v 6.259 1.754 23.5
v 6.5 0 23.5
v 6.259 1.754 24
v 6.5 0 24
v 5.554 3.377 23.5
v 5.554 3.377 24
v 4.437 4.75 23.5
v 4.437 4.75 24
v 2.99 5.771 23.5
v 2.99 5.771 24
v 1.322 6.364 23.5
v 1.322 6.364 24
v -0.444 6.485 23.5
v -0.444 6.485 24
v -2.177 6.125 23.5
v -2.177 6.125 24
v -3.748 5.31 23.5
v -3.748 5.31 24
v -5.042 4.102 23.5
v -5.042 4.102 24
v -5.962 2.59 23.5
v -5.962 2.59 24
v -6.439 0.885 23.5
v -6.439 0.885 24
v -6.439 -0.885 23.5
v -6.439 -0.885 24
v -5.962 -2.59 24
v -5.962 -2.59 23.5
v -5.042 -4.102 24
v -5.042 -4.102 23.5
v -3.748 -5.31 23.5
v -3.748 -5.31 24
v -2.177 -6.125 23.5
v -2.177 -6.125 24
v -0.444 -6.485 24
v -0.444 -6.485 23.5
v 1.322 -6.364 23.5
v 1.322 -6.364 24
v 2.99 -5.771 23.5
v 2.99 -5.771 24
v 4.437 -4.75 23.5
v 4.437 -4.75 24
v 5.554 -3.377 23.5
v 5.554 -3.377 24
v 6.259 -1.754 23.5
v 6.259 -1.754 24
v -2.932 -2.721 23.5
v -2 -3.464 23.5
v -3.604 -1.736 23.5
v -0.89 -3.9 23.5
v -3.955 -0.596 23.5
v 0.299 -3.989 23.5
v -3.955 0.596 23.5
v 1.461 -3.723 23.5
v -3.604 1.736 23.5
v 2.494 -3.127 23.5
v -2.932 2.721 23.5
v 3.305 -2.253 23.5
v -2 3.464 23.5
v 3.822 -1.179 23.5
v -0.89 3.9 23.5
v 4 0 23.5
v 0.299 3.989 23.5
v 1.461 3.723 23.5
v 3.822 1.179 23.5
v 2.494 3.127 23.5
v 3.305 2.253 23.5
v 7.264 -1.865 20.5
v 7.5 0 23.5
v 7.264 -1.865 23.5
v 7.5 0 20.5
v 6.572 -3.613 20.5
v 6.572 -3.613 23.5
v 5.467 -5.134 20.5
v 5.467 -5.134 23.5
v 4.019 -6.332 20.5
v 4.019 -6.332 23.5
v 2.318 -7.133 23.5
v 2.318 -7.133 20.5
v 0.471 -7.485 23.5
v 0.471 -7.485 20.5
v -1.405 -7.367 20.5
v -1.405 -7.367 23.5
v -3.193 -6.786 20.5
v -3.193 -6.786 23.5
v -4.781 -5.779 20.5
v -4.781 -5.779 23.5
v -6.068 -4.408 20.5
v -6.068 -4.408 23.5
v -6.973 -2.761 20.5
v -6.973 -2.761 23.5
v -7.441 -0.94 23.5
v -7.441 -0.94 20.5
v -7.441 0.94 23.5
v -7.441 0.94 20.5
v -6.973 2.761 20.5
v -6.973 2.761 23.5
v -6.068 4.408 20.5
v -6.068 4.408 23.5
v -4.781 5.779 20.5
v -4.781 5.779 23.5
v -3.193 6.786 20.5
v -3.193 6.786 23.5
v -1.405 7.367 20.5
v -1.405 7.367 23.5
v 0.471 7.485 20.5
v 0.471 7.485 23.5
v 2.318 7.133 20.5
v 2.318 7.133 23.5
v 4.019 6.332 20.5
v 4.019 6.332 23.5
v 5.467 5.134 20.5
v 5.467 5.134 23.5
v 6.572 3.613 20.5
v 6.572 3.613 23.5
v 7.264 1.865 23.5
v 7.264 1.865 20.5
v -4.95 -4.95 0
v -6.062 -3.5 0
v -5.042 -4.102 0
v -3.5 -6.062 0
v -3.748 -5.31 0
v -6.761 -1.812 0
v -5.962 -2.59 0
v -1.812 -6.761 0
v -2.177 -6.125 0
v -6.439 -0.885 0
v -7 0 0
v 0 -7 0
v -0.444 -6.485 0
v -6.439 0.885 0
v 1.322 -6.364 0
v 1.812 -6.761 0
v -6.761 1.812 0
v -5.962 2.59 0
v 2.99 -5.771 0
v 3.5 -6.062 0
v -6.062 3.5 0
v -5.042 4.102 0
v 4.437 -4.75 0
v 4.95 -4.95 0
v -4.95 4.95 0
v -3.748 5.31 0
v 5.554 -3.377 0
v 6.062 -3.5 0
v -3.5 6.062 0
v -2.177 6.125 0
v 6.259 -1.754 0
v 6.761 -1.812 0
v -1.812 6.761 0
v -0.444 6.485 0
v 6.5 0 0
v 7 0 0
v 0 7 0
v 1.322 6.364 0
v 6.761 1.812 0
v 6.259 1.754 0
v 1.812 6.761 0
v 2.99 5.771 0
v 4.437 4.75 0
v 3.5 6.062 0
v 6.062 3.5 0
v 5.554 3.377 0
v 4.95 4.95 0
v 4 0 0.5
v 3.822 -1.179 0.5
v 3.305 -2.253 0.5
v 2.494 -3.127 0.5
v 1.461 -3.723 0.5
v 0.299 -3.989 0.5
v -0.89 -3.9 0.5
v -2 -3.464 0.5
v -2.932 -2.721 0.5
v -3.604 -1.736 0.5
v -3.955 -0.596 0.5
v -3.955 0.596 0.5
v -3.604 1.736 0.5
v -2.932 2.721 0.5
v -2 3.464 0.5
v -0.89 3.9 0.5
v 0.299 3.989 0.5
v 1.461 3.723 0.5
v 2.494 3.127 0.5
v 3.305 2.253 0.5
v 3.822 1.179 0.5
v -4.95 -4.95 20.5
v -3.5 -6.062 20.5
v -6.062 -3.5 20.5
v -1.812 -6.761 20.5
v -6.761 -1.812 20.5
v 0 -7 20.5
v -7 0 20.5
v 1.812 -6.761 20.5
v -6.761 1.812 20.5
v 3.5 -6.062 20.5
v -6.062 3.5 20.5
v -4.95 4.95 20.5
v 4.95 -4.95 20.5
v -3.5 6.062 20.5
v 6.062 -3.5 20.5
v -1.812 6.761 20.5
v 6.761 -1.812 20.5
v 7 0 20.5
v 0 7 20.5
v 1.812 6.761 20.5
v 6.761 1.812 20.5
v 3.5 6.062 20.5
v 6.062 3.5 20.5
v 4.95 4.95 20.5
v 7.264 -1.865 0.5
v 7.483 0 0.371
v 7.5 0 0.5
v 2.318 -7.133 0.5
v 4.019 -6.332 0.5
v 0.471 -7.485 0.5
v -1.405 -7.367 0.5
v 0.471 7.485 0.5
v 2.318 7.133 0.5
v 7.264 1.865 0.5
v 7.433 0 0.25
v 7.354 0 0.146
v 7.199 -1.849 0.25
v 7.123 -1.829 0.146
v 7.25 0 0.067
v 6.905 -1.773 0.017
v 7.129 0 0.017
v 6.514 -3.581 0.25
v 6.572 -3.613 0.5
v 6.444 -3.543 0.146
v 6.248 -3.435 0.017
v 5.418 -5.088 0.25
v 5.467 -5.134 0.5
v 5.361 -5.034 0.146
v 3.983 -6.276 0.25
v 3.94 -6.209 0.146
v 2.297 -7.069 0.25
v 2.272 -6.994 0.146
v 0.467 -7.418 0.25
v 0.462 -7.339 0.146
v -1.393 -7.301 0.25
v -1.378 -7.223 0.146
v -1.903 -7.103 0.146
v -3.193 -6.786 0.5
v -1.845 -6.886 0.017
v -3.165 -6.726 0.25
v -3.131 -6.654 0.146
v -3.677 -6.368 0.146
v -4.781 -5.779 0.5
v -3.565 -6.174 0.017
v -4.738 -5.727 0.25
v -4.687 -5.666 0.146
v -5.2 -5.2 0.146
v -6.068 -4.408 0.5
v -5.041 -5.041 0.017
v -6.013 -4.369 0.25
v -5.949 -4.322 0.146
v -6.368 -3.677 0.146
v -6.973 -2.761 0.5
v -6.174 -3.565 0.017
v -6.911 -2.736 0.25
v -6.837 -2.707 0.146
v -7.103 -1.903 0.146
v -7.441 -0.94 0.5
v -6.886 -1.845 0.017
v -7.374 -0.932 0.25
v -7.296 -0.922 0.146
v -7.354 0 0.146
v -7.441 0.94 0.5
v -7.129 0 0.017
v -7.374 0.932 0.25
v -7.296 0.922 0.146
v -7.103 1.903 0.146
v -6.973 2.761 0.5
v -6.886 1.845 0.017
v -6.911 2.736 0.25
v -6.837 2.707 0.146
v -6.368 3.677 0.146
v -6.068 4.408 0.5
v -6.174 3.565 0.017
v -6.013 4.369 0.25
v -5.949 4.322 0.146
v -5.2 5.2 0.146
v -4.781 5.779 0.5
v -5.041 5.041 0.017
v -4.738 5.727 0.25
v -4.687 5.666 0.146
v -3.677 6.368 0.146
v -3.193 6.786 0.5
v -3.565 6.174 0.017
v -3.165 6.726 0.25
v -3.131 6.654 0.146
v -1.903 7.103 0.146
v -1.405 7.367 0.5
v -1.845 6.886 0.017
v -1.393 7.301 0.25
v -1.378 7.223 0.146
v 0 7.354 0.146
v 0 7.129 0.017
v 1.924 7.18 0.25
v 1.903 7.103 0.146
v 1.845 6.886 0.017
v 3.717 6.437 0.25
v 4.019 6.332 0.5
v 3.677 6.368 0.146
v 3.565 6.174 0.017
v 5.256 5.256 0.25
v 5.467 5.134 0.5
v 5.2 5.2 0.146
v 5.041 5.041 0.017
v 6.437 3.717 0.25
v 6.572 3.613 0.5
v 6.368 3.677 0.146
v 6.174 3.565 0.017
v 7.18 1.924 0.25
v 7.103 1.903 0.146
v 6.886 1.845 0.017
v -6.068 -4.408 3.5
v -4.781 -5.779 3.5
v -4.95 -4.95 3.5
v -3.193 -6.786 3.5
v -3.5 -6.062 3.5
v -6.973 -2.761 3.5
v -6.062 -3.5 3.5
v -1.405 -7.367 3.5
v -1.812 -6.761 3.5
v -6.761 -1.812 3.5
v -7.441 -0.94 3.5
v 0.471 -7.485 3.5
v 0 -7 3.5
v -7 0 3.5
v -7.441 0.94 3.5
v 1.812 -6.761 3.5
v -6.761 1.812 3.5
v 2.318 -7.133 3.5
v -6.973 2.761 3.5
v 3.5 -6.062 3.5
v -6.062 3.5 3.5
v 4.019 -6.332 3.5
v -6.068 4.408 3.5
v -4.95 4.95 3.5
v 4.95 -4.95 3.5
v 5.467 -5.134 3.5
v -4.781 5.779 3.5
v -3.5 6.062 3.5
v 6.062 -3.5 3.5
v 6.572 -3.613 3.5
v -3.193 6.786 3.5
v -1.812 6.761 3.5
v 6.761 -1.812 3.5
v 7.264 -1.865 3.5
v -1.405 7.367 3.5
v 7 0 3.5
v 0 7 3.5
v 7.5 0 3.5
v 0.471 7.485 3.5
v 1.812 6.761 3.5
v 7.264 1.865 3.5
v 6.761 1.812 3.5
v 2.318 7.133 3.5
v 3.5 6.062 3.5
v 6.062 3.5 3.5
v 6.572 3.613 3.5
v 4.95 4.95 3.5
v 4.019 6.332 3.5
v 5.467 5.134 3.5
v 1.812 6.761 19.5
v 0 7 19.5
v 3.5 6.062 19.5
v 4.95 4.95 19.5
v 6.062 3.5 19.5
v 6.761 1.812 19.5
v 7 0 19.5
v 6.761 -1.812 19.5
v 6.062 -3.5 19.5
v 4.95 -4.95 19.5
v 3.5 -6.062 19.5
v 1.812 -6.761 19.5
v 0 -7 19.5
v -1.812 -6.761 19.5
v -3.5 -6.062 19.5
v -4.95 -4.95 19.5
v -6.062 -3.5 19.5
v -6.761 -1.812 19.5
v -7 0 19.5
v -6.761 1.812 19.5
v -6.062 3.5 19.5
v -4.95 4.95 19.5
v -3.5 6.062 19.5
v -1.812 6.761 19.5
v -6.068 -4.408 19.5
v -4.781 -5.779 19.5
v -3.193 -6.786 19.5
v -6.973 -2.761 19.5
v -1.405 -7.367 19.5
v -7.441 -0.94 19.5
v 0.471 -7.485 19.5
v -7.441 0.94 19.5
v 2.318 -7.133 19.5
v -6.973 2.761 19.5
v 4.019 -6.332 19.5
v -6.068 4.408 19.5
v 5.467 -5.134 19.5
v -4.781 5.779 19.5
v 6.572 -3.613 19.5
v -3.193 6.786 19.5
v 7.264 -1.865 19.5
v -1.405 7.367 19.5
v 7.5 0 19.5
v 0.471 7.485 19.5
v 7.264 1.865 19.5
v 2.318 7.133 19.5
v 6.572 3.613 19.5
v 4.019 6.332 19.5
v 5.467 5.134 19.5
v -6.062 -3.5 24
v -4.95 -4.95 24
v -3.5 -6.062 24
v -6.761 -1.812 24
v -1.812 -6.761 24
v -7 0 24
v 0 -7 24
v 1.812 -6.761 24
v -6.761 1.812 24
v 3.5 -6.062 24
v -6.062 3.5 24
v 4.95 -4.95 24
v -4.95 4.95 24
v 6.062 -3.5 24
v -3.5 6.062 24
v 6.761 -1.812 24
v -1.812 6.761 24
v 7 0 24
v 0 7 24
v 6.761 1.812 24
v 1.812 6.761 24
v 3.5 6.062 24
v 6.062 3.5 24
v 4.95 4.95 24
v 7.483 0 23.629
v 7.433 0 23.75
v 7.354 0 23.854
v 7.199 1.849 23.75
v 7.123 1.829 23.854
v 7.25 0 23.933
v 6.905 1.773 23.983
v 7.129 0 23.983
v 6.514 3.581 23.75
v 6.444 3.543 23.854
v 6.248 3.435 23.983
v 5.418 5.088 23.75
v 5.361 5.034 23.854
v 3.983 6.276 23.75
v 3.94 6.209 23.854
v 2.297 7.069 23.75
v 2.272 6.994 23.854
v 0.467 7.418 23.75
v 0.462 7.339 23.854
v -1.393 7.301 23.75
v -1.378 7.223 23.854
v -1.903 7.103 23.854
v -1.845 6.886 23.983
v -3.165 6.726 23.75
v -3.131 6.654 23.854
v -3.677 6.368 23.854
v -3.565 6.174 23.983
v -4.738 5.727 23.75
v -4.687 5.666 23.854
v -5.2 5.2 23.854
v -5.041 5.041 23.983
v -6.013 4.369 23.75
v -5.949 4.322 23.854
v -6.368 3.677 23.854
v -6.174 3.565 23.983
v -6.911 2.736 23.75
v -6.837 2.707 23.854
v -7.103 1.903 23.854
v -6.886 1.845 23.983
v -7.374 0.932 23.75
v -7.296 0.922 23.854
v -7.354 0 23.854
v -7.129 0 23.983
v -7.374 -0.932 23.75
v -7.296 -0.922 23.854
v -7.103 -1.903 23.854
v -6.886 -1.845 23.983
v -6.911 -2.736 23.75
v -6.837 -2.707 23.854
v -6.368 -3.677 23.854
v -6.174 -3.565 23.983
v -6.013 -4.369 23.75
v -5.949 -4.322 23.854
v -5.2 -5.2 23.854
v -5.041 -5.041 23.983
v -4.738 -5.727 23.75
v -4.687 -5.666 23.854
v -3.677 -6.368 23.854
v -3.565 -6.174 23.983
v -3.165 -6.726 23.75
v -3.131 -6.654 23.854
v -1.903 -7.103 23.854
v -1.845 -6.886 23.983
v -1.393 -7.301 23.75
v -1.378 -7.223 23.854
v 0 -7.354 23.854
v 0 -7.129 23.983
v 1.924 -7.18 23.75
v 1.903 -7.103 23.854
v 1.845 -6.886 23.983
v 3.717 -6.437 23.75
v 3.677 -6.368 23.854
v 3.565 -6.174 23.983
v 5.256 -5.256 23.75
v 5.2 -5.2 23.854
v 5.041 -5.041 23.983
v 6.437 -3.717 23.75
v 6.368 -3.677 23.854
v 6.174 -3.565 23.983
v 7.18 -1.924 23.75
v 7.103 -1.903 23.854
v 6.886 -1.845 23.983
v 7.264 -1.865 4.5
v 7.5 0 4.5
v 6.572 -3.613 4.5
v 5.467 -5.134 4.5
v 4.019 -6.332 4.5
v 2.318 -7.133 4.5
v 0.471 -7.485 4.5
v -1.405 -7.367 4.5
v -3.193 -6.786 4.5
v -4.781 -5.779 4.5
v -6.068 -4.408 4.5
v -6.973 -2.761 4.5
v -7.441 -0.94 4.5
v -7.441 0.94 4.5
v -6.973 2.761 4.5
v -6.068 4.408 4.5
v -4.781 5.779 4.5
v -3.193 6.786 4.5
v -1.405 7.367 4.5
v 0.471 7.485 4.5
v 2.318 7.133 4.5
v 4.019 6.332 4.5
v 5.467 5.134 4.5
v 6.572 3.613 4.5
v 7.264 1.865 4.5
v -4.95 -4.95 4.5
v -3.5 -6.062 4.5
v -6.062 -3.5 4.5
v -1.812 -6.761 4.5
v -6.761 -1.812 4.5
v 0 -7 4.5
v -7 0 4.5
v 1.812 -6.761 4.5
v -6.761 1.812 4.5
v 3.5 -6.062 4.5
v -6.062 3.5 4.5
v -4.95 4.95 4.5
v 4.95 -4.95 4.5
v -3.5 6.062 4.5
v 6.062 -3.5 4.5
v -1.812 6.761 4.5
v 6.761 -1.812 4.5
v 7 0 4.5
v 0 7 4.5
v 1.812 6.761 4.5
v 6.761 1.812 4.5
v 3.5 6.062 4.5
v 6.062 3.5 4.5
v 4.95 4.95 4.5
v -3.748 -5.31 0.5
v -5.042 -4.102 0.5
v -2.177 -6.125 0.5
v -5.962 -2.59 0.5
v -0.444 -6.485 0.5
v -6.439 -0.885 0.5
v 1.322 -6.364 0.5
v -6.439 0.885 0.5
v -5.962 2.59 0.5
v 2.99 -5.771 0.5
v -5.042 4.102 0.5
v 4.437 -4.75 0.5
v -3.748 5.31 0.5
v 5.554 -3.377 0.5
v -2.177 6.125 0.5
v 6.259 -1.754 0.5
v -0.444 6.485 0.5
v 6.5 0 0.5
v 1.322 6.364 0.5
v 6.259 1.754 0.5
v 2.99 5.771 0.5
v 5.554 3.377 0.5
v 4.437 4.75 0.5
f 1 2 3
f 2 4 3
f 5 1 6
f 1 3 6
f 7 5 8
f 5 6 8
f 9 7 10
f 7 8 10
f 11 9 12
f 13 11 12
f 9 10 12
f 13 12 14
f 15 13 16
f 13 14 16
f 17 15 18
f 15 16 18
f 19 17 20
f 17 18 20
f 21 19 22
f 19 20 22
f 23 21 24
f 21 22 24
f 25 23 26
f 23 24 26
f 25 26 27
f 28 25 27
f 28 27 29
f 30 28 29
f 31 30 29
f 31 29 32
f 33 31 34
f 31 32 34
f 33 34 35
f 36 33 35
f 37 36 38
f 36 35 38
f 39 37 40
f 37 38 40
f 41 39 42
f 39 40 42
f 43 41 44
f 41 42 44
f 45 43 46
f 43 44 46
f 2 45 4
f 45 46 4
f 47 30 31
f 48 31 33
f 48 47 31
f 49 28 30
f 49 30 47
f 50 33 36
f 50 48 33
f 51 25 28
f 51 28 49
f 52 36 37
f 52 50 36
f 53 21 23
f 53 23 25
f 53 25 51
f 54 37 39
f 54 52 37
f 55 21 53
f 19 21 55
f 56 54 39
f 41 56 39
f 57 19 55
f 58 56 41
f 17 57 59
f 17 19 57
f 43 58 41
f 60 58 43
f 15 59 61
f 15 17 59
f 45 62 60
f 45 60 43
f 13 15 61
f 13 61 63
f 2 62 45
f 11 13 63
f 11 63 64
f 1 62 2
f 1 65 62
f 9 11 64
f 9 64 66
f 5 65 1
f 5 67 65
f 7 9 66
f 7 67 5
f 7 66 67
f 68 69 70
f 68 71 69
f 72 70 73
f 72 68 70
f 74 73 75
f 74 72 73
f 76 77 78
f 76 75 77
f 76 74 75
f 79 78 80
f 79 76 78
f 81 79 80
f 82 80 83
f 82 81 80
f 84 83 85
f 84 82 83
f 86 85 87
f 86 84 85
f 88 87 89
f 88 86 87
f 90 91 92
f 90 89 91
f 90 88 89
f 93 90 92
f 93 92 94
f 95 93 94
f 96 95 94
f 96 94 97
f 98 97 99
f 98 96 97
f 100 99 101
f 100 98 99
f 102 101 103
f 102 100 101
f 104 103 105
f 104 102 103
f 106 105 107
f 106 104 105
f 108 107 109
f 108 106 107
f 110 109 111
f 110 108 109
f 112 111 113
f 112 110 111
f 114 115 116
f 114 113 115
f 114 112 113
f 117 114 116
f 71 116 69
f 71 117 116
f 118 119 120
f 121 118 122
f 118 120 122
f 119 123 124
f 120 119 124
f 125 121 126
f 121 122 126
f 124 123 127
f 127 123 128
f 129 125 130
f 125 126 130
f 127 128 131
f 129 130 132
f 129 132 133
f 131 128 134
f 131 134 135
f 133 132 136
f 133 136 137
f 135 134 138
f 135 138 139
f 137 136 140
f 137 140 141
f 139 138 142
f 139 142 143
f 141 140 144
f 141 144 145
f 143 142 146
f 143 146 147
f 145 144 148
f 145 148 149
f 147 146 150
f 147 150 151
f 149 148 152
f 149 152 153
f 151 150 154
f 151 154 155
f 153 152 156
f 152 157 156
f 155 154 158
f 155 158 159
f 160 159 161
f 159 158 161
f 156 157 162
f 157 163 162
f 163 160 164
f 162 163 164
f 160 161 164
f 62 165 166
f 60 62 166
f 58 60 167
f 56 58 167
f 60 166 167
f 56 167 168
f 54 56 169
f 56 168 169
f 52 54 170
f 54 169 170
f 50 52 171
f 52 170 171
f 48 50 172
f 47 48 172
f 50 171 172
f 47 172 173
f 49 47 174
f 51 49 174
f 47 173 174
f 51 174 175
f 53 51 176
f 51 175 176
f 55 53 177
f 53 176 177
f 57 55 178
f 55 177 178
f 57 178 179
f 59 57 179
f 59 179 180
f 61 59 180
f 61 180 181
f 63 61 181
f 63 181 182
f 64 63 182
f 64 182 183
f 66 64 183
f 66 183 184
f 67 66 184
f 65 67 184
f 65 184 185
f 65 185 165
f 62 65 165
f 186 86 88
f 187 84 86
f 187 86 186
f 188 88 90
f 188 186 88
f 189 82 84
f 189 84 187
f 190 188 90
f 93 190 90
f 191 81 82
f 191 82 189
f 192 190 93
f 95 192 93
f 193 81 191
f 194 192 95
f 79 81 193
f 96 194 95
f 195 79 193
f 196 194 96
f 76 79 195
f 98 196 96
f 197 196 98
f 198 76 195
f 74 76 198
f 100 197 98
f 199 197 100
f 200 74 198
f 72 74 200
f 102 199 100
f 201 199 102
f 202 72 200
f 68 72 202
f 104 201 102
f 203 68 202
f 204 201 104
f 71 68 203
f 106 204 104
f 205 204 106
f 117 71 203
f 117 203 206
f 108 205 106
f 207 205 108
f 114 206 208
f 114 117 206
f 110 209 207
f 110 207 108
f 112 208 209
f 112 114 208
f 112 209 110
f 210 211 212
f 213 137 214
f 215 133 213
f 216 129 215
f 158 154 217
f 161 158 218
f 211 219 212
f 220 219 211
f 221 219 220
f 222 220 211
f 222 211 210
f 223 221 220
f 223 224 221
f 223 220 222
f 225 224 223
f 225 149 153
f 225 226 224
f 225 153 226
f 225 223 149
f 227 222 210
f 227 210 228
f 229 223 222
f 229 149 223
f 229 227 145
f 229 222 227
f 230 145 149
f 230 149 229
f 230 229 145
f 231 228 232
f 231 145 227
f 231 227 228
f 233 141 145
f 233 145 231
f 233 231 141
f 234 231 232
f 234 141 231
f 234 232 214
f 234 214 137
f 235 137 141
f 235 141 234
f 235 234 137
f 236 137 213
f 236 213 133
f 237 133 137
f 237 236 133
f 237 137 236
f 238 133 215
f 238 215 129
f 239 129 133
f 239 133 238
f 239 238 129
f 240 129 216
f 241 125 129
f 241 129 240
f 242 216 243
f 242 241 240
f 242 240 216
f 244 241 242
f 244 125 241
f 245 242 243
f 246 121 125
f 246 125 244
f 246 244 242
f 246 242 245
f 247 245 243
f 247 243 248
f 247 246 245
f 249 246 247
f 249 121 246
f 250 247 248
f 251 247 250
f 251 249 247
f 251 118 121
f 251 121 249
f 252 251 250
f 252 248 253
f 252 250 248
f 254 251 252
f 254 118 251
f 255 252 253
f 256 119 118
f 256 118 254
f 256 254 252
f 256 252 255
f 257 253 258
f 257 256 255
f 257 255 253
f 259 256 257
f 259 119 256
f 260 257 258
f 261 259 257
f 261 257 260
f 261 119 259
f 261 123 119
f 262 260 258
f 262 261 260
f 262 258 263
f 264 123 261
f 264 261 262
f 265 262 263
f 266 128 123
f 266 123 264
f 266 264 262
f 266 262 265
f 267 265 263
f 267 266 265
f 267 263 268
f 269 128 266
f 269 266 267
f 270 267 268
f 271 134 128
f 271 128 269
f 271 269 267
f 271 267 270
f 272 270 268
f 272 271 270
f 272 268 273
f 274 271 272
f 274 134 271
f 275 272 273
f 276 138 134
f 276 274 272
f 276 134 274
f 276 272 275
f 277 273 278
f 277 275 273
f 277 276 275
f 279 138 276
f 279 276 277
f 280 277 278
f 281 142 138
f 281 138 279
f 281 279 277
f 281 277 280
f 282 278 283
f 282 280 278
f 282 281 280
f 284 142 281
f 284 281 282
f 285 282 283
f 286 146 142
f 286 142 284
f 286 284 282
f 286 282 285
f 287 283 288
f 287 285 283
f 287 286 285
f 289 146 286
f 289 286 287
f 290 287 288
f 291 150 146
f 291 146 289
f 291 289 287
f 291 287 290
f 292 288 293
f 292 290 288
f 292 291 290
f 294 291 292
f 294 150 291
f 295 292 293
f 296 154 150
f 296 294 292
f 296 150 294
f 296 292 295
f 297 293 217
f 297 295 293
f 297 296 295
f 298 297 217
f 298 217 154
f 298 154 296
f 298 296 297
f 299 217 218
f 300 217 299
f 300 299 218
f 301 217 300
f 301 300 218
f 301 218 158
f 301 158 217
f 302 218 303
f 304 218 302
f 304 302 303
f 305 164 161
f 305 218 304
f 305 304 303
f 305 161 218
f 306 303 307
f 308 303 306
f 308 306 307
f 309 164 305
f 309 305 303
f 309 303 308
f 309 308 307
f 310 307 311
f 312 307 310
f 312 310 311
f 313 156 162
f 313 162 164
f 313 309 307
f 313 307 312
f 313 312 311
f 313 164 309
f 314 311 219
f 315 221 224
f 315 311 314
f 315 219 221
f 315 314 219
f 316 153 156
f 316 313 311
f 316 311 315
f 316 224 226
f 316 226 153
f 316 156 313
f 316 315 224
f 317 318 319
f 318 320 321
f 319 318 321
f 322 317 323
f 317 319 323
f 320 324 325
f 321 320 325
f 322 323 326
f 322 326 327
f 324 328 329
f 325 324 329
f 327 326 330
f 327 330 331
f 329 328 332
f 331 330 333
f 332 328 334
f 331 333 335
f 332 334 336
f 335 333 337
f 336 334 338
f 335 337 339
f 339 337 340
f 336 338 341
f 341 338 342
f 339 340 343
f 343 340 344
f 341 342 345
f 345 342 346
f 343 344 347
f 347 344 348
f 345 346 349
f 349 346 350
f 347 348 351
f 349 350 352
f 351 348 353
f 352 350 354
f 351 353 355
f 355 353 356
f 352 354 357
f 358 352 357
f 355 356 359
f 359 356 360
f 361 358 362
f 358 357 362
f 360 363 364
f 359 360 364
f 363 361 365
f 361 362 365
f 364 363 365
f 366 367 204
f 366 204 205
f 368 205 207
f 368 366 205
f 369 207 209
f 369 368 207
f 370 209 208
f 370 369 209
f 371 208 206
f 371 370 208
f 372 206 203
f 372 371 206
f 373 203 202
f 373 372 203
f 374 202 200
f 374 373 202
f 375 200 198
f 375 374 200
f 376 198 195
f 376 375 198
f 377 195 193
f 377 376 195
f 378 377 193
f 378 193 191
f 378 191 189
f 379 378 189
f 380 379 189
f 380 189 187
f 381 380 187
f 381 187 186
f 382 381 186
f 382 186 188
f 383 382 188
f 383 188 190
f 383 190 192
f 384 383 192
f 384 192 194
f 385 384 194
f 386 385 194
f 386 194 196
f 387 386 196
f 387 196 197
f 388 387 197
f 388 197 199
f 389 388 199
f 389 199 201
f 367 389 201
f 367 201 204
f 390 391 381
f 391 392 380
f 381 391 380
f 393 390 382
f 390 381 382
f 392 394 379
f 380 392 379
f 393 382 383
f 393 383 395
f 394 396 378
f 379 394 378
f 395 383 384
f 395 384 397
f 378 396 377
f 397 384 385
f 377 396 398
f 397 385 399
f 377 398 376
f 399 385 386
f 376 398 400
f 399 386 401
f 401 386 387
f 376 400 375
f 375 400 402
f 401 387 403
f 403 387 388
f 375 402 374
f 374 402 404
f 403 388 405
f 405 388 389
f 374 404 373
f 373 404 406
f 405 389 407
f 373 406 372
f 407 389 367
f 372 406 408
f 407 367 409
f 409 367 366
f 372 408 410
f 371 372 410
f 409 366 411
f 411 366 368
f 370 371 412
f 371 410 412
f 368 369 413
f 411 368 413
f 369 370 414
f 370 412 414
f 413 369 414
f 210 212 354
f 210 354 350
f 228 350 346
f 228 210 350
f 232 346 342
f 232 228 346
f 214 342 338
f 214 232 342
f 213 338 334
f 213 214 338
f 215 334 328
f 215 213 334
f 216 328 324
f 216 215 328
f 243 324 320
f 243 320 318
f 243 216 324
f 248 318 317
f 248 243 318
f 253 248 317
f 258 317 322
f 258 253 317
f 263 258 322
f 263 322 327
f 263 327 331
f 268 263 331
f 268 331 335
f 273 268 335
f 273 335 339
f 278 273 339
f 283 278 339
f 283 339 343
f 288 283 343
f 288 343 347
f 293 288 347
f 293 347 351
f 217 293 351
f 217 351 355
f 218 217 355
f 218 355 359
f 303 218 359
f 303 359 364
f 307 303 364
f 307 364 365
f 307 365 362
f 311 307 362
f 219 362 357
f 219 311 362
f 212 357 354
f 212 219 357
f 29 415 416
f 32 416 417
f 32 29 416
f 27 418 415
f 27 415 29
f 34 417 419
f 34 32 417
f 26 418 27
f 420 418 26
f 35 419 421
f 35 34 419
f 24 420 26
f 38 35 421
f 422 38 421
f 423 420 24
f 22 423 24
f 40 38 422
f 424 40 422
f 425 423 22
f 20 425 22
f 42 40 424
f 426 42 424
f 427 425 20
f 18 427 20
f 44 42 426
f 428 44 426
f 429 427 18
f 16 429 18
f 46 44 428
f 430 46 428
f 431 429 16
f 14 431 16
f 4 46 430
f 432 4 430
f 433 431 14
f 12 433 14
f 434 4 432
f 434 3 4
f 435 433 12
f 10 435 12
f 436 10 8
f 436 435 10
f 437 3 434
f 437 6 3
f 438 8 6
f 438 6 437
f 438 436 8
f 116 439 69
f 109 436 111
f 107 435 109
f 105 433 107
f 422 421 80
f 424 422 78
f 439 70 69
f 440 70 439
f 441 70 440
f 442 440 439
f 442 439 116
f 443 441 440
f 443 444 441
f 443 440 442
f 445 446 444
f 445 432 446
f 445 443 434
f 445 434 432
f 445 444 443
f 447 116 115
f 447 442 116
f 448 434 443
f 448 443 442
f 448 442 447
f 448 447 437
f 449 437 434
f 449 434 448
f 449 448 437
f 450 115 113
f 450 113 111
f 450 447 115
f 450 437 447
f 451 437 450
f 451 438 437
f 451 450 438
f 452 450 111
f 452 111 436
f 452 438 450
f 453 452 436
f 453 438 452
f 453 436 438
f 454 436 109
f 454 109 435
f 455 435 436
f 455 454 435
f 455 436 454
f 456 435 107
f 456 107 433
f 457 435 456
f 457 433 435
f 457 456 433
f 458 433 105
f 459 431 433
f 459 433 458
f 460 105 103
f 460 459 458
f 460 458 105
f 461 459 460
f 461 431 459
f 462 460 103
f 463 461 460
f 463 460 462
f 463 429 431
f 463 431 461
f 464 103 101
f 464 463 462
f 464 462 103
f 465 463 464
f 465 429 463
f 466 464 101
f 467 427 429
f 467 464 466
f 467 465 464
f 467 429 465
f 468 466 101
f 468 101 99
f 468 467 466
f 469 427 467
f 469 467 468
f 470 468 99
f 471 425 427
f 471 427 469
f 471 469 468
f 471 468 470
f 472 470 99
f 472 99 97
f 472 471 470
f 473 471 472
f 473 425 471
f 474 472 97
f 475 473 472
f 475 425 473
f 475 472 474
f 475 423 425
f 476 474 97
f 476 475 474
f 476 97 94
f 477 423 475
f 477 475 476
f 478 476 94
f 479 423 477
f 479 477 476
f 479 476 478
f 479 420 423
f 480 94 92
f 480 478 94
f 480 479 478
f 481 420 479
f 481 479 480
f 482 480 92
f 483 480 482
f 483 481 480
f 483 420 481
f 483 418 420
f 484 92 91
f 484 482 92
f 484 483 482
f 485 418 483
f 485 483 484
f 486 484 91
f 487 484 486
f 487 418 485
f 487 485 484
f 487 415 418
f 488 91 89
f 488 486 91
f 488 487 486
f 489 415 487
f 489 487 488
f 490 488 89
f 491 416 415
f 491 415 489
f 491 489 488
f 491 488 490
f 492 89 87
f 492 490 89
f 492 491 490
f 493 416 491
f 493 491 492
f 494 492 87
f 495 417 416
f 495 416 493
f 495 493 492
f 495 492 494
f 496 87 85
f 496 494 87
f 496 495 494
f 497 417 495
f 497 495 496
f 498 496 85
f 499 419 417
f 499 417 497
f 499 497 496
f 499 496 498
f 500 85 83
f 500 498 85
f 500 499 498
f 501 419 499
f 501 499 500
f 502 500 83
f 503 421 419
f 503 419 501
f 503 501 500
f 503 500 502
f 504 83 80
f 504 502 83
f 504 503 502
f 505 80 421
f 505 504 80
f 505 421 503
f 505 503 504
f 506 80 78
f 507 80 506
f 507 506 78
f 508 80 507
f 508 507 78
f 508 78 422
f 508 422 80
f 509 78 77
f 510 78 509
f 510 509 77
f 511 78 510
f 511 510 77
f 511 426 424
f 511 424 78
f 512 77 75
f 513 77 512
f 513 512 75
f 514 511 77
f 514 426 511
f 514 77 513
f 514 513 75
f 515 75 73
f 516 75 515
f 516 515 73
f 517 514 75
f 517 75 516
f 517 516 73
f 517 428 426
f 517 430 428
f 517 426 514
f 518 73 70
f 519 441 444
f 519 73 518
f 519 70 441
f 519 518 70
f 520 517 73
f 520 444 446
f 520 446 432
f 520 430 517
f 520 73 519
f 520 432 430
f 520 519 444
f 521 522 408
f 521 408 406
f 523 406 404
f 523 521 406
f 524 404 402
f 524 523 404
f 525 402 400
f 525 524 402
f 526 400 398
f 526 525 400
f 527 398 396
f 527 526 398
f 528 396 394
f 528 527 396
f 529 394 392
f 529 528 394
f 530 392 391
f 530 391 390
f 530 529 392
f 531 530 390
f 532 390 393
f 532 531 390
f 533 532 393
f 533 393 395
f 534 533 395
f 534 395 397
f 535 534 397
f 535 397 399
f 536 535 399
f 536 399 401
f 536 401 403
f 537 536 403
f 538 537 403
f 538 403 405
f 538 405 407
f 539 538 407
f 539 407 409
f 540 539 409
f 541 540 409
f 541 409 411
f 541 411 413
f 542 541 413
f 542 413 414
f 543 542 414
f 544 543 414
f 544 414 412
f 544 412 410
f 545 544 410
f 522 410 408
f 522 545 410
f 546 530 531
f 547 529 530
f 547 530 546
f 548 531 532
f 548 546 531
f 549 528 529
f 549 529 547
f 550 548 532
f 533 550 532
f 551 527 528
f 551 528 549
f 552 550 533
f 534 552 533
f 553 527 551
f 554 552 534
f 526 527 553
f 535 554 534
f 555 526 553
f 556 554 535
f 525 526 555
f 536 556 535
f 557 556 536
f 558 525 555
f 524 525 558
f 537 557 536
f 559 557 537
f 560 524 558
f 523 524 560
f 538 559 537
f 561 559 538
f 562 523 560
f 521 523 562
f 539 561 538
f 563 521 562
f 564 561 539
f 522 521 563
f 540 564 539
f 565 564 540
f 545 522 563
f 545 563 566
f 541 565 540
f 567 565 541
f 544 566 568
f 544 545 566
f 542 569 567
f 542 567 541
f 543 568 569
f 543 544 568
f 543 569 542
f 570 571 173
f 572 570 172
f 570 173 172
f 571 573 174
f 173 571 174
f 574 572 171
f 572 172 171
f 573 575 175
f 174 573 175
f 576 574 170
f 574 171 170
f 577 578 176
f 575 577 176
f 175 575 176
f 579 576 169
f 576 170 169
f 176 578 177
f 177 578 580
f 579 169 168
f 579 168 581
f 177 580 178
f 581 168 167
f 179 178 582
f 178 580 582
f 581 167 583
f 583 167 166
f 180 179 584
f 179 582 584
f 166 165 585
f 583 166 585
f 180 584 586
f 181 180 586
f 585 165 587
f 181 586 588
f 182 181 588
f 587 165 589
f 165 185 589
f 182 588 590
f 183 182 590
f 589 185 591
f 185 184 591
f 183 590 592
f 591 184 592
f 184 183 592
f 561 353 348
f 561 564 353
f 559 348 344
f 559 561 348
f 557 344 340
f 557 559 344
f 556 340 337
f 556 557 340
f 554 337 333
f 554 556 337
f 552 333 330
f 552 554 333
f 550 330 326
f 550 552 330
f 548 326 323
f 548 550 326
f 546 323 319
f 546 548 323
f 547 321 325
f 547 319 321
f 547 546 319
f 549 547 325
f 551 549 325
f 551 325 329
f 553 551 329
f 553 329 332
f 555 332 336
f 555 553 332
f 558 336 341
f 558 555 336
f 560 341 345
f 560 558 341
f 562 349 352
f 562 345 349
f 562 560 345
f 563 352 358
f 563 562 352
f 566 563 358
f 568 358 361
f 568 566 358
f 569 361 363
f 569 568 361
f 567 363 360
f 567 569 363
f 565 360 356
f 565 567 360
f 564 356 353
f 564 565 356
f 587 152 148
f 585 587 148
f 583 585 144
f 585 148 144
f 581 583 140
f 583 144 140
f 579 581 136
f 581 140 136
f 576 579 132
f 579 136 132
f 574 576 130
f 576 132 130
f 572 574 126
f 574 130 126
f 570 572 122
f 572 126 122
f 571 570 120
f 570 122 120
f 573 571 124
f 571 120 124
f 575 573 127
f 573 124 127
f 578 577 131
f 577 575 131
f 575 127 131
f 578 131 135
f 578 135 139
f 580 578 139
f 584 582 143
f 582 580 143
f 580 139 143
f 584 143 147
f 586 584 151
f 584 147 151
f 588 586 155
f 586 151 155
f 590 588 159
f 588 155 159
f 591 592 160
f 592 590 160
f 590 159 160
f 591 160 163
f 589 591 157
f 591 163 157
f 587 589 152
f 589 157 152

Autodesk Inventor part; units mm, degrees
ref_plane "YZ Plane" through (0, 0, 0) normal (1, 0, 0) x (0, 1, 0)
ref_plane "XZ Plane" through (0, 0, 0) normal (0, 1, 0) x (-1, 0, 0)
ref_plane "XY Plane" through (0, 0, 0) normal (0, 0, 1) x (1, 0, 0)
sketch "Sketch1" plane through (0, 0, 0) normal (0, 0, 1) x (1, 0, 0)
  circle A0 centre (0, 0) radius 4
  circle A1 centre (0, 0) radius 7.5
  dimension "d2" = 8
  dimension "d3" = 15
extrude "Extrusion1" add sketch "Sketch1" along normal blind 24
fillet "Fillet1" radius 0.5 2 edges at (-7.5, 0, 24) (-7.5, 0, 0)
sketch "Sketch2" plane through (0, 0, 0) normal (1, 0, 0) x (0, 1, 0)
  arc A0 (7, 0) -> (7.5, 0.5) centre (7, 0.5) ccw projected
  line L0 (7, 0) -> (4, 0) projected
  line L1 (4, 0) -> (4, 24) projected
  line L2 (4, 24) -> (7, 24) projected
  arc A1 (7.5, 23.5) -> (7, 24) centre (7, 23.5) ccw projected
  line L3 (7.5, 23.5) -> (7.5, 0.5) projected
  arc A2 (-7.5, 0.5) -> (-7, 0) centre (-7, 0.5) ccw projected
  line L4 (-7.5, 0.5) -> (-7.5, 23.5) projected
  arc A3 (-7, 24) -> (-7.5, 23.5) centre (-7, 23.5) ccw projected
  line L5 (-7, 24) -> (-4, 24) projected
  line L6 (-4, 24) -> (-4, 0) projected
  line L7 (-4, 0) -> (-7, 0) projected
  line L8 (7.5, 0.5) -> (7.5, 23.5) projected
  line L9 (7.5, 20.5) -> (7, 20.5)
  line L10 (7, 20.5) -> (7, 19.5)
  line L11 (7, 19.5) -> (7.5, 19.5)
  line L12 (7.5, 12) -> (4, 12) construction
  line L13 (7.5, 3.5) -> (7, 3.5)
  line L14 (7, 3.5) -> (7, 4.5)
  line L15 (7, 4.5) -> (7.5, 4.5)
  line L16 (-4, 24) -> (4, 24) construction
  line L17 (0, 24) -> (0, 0) construction
  point P0 (7.5, 3.5)
  point P1 (7.5, 4.5)
  dimension "d5" = 3.5
  dimension "d6" = 1
  dimension "d7" = 0.5
revolve "Revolution1" cut sketch "Sketch2" angle 360 about axis through (0, 0, 24) along (0, 0, -1) contours L13 L14 L15 L3 | L11 L10 L9 L3
sketch "Sketch3" plane through (0, 0, 24) normal (0, 0, 1) x (1, 0, 0)
  circle A0 centre (0, 0) radius 6.5
  circle A1 centre (0, 0) radius 7.5 projected
  dimension "d9" = 1
extrude "Extrusion2" cut sketch "Sketch3" against normal blind 0.5 contours A0
extrude "Extrusion3" cut sketch "Sketch3" along normal blind 0.5 from surface at -24 contours A0
properties part number "berring" material "Aluminum 6061"
